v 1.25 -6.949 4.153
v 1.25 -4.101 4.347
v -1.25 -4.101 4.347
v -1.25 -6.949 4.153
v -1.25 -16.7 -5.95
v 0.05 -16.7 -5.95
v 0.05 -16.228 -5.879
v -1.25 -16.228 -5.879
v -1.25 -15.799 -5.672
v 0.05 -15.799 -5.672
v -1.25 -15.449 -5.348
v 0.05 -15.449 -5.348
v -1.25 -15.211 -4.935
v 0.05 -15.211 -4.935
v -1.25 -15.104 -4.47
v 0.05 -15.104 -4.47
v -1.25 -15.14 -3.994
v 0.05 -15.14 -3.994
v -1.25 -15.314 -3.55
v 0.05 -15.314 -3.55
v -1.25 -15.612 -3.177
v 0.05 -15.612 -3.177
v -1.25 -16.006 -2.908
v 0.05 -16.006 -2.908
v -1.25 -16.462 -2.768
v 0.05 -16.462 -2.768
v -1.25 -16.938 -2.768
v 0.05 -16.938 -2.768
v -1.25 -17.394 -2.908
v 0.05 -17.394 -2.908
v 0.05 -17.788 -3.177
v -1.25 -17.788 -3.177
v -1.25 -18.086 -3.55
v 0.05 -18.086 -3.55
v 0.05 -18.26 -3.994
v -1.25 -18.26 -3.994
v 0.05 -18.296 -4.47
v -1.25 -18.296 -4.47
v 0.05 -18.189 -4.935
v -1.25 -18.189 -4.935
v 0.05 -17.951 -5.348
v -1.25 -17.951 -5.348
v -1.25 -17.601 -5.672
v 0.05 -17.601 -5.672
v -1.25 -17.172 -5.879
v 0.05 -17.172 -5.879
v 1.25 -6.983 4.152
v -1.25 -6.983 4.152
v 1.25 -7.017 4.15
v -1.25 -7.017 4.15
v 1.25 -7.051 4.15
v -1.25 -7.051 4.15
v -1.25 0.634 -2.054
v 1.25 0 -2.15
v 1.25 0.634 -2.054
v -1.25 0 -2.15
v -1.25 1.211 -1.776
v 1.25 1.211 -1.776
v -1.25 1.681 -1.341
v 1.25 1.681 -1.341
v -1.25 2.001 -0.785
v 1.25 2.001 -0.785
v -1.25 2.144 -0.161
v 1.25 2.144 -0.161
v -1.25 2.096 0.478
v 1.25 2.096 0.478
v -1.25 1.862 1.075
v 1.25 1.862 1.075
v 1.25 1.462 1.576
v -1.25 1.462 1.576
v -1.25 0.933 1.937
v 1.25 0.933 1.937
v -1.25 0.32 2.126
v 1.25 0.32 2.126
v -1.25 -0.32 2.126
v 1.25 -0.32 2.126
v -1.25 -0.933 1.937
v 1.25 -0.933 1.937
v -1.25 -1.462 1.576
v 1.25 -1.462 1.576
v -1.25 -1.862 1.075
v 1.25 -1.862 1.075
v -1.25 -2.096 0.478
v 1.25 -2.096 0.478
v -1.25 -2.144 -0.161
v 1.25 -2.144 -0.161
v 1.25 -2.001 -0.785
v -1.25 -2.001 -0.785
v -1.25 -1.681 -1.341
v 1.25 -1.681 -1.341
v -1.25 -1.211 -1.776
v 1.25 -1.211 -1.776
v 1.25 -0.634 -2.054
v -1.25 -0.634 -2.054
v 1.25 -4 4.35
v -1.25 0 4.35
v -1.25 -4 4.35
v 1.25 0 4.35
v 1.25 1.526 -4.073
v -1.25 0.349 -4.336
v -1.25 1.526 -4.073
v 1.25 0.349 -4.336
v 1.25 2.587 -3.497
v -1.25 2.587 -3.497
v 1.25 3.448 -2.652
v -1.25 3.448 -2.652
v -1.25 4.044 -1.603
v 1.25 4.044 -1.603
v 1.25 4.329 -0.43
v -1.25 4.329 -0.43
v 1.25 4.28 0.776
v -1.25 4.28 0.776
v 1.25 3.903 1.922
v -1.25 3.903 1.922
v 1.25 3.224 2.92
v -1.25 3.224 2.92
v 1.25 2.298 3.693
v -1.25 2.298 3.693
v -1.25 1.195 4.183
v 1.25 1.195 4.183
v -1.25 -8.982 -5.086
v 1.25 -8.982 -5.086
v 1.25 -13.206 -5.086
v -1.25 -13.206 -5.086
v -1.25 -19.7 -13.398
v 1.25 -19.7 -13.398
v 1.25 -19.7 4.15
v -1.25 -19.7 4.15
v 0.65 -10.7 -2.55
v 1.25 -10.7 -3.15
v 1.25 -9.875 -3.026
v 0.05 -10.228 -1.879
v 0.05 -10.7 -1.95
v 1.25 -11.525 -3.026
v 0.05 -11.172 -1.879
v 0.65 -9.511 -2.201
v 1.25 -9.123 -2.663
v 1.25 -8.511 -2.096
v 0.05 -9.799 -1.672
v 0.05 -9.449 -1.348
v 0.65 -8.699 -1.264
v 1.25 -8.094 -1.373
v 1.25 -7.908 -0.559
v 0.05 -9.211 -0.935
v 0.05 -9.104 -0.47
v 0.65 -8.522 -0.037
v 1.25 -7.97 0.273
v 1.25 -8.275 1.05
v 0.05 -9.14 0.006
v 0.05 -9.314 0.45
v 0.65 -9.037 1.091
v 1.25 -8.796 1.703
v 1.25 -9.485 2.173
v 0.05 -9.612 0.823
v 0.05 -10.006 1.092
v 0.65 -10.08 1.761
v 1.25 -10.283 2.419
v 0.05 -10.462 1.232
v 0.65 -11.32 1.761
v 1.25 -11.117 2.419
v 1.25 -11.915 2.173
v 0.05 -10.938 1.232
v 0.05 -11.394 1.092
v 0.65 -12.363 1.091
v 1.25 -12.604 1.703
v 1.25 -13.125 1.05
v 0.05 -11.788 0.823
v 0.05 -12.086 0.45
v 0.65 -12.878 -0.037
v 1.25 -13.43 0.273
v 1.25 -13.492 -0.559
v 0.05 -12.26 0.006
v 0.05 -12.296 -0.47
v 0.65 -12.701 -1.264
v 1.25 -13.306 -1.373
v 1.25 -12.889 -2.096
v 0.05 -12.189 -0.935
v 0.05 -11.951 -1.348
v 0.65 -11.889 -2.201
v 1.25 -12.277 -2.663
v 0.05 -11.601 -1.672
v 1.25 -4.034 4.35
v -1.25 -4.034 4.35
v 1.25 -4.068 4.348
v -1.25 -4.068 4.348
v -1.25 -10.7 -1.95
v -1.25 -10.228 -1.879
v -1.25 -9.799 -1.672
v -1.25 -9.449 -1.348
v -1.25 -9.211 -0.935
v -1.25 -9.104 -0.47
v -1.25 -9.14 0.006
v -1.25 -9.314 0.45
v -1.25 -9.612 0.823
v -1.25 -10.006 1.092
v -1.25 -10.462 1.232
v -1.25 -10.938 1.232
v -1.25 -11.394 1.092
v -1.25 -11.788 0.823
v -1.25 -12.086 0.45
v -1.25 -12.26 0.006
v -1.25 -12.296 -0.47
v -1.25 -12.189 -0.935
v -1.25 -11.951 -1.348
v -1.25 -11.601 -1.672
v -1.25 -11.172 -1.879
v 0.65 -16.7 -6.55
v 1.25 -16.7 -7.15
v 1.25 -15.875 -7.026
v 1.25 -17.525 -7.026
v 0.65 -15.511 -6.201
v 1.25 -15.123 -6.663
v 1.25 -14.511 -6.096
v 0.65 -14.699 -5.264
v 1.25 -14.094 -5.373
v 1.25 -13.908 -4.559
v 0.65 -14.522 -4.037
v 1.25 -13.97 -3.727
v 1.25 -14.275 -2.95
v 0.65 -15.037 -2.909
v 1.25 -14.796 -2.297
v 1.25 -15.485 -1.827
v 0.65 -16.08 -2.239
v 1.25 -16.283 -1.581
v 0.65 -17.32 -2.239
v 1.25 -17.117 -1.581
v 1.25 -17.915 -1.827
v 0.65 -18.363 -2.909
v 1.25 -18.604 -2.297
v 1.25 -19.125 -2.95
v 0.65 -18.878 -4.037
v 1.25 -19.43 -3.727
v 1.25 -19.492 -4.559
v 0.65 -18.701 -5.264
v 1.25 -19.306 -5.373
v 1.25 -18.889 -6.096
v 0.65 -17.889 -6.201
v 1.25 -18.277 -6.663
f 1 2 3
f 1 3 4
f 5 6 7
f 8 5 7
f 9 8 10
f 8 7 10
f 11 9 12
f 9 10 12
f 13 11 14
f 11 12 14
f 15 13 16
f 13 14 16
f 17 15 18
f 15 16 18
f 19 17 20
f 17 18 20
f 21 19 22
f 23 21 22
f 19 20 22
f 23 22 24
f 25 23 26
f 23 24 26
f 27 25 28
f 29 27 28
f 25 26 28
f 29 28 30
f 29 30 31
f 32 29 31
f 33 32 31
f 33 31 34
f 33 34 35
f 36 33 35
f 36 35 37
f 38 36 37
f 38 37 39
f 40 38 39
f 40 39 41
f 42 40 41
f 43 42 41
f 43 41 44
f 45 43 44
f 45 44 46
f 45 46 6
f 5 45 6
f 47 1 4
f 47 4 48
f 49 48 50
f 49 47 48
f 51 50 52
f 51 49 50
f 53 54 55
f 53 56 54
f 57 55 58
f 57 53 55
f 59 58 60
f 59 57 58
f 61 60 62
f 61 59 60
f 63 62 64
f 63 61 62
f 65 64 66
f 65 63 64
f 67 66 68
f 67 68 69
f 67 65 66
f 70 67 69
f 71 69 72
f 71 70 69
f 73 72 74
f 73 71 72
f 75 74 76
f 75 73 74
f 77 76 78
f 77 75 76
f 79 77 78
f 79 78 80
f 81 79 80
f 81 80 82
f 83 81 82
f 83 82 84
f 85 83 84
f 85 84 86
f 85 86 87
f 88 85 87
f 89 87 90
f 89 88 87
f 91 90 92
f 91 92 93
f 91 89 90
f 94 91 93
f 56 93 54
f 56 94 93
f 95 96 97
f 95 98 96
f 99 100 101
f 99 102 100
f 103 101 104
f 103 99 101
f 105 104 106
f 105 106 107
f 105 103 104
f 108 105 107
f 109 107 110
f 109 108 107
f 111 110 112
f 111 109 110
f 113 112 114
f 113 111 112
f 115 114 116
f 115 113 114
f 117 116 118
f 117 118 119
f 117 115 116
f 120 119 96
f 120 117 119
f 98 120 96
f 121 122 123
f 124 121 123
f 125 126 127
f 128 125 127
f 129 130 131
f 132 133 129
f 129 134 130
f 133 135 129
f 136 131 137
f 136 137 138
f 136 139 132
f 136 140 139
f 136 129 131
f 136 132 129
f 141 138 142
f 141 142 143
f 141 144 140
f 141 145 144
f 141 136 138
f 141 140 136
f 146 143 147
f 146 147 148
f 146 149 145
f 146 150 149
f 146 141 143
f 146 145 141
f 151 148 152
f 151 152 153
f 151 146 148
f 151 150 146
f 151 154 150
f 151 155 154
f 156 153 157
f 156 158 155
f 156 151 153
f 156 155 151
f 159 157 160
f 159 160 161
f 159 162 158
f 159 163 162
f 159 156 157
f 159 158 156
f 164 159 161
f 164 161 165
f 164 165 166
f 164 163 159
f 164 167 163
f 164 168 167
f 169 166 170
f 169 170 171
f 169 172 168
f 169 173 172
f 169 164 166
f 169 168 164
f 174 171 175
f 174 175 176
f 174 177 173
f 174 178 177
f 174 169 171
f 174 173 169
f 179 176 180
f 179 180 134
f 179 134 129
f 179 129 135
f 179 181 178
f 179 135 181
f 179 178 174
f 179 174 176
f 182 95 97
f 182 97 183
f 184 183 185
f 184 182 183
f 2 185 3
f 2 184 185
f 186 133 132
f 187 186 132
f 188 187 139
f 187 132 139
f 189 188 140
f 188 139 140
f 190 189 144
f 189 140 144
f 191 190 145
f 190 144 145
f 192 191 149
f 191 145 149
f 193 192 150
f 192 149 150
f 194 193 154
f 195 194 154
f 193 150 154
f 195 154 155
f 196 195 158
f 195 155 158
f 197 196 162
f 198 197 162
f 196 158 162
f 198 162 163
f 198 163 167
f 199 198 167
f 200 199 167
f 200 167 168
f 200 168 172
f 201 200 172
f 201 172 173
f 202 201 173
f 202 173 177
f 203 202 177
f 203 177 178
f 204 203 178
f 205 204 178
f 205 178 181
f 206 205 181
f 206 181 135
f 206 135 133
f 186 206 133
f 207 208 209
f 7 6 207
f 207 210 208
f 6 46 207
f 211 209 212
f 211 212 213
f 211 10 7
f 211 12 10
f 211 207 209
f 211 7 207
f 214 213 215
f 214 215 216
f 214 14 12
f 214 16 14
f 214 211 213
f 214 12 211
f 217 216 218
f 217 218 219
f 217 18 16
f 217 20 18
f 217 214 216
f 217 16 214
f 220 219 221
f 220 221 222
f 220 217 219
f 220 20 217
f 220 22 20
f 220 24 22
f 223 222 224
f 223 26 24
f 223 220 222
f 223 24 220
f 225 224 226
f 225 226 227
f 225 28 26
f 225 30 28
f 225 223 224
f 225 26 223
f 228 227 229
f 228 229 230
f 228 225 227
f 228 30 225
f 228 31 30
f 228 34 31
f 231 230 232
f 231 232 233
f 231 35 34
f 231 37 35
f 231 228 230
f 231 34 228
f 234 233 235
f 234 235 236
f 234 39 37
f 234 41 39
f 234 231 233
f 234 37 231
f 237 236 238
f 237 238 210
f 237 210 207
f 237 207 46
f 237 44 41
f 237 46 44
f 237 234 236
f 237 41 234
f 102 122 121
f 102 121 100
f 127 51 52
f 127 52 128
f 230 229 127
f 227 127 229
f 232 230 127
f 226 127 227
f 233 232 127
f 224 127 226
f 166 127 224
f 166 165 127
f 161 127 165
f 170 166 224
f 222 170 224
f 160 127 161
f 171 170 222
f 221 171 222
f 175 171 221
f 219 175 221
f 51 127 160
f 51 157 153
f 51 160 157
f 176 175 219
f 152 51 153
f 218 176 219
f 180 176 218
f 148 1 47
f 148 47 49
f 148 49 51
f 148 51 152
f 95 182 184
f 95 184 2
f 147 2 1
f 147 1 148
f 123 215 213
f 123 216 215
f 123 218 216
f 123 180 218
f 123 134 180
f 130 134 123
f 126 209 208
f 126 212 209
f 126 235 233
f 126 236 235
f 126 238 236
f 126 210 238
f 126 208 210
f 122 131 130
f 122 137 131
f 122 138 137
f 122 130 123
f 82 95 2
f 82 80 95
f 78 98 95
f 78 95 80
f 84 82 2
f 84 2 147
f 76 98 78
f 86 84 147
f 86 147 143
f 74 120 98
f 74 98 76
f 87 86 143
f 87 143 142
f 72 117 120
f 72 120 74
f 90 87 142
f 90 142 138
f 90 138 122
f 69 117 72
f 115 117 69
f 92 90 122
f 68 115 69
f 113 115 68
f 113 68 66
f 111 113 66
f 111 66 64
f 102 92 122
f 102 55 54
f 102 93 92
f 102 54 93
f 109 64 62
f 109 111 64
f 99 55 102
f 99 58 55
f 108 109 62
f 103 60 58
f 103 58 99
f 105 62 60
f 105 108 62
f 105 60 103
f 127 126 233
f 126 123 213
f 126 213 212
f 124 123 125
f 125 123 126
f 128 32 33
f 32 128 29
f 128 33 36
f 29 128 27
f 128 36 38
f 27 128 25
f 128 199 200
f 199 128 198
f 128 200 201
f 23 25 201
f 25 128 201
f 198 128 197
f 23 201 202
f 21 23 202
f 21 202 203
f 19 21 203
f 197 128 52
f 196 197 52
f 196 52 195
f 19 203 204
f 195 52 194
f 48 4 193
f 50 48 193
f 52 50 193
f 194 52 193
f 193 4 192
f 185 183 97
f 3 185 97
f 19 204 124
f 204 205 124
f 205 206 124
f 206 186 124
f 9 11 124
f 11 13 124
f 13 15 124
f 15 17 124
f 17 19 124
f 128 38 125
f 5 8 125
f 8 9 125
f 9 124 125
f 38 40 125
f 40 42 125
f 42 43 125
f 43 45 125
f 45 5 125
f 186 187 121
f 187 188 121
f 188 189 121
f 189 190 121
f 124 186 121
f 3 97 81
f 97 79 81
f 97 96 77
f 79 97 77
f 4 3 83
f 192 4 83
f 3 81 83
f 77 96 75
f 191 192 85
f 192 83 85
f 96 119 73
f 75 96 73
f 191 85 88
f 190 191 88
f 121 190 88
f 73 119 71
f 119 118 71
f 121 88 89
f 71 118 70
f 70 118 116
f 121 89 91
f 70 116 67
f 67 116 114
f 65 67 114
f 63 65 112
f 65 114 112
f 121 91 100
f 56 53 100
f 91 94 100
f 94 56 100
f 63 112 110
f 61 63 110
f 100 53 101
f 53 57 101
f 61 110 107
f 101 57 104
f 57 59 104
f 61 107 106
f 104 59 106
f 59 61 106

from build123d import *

# Parameters (mm, degrees)
SKETCH1_R           = 2.15
BOSS_EXTRUDE1_DEPTH = 1.25
SKETCH3_R           = 1.6
CUT_EXTRUDE1_DEPTH  = 26.195485707
CHAMFER1_SIZE       = 1.2


with BuildPart() as part:
    # Sketch1 → Boss-Extrude1 (new, symmetric)
    with BuildSketch(Plane(origin=(0, 0, 0), x_dir=(0, 0, -1), z_dir=(1, 0, 0))):
        with BuildLine():
            Line((-4.35, 0), (-4.35, -4))
            ThreePointArc((-4.35, -4), (-4.349140426, -4.050773847), (-4.346562689, -4.101489502))
            Line((-4.346562689, -4.101489502), (-4.153437311, -6.949313458))
            ThreePointArc((-4.153437311, -6.949313458), (-4.150859574, -7.000029113), (-4.15, -7.050802959))
            Line((-4.15, -7.050802959), (-4.15, -20.2))
            Line((-4.15, -20.2), (14.85, -20.2))
            Line((14.85, -20.2), (5.393870957, -12.812062296))
            Line((5.393870957, -12.812062296), (4.33601498, 0.348531342))
            ThreePointArc((4.33601498, 0.348531342), (-0.174405904, 4.346502339), (-4.35, 0))
        make_face()
        Circle(SKETCH1_R, mode=Mode.SUBTRACT)
    extrude(amount=BOSS_EXTRUDE1_DEPTH, both=True)

    # Sketch3 → Cut-Extrude1 (cut, through all)
    with BuildSketch(Plane(origin=(1.25, 0, 0), x_dir=(0, 0, -1), z_dir=(1, 0, 0))):
        with Locations((0.35, -10.7)):
            Circle(SKETCH3_R)
        with Locations((4.35, -16.7)):
            Circle(SKETCH3_R)
        Polygon((-4.15, -20.2), (14.85, -20.2), (5.393870957, -12.812062296), (5.086040219, -8.982396127), (5.086040219, -13.206067673), (13.397894561, -19.7), (-4.15, -19.7), align=None)
    extrude(amount=-CUT_EXTRUDE1_DEPTH, mode=Mode.SUBTRACT)

    # Chamfer1
    chamfer1_edges = [part.edges().sort_by_distance(p)[0] for p in [
        (1.25, -16.7, -2.75),
        (1.25, -10.7, 1.25),
    ]]
    chamfer(chamfer1_edges, length=CHAMFER1_SIZE)


solid = part.part
